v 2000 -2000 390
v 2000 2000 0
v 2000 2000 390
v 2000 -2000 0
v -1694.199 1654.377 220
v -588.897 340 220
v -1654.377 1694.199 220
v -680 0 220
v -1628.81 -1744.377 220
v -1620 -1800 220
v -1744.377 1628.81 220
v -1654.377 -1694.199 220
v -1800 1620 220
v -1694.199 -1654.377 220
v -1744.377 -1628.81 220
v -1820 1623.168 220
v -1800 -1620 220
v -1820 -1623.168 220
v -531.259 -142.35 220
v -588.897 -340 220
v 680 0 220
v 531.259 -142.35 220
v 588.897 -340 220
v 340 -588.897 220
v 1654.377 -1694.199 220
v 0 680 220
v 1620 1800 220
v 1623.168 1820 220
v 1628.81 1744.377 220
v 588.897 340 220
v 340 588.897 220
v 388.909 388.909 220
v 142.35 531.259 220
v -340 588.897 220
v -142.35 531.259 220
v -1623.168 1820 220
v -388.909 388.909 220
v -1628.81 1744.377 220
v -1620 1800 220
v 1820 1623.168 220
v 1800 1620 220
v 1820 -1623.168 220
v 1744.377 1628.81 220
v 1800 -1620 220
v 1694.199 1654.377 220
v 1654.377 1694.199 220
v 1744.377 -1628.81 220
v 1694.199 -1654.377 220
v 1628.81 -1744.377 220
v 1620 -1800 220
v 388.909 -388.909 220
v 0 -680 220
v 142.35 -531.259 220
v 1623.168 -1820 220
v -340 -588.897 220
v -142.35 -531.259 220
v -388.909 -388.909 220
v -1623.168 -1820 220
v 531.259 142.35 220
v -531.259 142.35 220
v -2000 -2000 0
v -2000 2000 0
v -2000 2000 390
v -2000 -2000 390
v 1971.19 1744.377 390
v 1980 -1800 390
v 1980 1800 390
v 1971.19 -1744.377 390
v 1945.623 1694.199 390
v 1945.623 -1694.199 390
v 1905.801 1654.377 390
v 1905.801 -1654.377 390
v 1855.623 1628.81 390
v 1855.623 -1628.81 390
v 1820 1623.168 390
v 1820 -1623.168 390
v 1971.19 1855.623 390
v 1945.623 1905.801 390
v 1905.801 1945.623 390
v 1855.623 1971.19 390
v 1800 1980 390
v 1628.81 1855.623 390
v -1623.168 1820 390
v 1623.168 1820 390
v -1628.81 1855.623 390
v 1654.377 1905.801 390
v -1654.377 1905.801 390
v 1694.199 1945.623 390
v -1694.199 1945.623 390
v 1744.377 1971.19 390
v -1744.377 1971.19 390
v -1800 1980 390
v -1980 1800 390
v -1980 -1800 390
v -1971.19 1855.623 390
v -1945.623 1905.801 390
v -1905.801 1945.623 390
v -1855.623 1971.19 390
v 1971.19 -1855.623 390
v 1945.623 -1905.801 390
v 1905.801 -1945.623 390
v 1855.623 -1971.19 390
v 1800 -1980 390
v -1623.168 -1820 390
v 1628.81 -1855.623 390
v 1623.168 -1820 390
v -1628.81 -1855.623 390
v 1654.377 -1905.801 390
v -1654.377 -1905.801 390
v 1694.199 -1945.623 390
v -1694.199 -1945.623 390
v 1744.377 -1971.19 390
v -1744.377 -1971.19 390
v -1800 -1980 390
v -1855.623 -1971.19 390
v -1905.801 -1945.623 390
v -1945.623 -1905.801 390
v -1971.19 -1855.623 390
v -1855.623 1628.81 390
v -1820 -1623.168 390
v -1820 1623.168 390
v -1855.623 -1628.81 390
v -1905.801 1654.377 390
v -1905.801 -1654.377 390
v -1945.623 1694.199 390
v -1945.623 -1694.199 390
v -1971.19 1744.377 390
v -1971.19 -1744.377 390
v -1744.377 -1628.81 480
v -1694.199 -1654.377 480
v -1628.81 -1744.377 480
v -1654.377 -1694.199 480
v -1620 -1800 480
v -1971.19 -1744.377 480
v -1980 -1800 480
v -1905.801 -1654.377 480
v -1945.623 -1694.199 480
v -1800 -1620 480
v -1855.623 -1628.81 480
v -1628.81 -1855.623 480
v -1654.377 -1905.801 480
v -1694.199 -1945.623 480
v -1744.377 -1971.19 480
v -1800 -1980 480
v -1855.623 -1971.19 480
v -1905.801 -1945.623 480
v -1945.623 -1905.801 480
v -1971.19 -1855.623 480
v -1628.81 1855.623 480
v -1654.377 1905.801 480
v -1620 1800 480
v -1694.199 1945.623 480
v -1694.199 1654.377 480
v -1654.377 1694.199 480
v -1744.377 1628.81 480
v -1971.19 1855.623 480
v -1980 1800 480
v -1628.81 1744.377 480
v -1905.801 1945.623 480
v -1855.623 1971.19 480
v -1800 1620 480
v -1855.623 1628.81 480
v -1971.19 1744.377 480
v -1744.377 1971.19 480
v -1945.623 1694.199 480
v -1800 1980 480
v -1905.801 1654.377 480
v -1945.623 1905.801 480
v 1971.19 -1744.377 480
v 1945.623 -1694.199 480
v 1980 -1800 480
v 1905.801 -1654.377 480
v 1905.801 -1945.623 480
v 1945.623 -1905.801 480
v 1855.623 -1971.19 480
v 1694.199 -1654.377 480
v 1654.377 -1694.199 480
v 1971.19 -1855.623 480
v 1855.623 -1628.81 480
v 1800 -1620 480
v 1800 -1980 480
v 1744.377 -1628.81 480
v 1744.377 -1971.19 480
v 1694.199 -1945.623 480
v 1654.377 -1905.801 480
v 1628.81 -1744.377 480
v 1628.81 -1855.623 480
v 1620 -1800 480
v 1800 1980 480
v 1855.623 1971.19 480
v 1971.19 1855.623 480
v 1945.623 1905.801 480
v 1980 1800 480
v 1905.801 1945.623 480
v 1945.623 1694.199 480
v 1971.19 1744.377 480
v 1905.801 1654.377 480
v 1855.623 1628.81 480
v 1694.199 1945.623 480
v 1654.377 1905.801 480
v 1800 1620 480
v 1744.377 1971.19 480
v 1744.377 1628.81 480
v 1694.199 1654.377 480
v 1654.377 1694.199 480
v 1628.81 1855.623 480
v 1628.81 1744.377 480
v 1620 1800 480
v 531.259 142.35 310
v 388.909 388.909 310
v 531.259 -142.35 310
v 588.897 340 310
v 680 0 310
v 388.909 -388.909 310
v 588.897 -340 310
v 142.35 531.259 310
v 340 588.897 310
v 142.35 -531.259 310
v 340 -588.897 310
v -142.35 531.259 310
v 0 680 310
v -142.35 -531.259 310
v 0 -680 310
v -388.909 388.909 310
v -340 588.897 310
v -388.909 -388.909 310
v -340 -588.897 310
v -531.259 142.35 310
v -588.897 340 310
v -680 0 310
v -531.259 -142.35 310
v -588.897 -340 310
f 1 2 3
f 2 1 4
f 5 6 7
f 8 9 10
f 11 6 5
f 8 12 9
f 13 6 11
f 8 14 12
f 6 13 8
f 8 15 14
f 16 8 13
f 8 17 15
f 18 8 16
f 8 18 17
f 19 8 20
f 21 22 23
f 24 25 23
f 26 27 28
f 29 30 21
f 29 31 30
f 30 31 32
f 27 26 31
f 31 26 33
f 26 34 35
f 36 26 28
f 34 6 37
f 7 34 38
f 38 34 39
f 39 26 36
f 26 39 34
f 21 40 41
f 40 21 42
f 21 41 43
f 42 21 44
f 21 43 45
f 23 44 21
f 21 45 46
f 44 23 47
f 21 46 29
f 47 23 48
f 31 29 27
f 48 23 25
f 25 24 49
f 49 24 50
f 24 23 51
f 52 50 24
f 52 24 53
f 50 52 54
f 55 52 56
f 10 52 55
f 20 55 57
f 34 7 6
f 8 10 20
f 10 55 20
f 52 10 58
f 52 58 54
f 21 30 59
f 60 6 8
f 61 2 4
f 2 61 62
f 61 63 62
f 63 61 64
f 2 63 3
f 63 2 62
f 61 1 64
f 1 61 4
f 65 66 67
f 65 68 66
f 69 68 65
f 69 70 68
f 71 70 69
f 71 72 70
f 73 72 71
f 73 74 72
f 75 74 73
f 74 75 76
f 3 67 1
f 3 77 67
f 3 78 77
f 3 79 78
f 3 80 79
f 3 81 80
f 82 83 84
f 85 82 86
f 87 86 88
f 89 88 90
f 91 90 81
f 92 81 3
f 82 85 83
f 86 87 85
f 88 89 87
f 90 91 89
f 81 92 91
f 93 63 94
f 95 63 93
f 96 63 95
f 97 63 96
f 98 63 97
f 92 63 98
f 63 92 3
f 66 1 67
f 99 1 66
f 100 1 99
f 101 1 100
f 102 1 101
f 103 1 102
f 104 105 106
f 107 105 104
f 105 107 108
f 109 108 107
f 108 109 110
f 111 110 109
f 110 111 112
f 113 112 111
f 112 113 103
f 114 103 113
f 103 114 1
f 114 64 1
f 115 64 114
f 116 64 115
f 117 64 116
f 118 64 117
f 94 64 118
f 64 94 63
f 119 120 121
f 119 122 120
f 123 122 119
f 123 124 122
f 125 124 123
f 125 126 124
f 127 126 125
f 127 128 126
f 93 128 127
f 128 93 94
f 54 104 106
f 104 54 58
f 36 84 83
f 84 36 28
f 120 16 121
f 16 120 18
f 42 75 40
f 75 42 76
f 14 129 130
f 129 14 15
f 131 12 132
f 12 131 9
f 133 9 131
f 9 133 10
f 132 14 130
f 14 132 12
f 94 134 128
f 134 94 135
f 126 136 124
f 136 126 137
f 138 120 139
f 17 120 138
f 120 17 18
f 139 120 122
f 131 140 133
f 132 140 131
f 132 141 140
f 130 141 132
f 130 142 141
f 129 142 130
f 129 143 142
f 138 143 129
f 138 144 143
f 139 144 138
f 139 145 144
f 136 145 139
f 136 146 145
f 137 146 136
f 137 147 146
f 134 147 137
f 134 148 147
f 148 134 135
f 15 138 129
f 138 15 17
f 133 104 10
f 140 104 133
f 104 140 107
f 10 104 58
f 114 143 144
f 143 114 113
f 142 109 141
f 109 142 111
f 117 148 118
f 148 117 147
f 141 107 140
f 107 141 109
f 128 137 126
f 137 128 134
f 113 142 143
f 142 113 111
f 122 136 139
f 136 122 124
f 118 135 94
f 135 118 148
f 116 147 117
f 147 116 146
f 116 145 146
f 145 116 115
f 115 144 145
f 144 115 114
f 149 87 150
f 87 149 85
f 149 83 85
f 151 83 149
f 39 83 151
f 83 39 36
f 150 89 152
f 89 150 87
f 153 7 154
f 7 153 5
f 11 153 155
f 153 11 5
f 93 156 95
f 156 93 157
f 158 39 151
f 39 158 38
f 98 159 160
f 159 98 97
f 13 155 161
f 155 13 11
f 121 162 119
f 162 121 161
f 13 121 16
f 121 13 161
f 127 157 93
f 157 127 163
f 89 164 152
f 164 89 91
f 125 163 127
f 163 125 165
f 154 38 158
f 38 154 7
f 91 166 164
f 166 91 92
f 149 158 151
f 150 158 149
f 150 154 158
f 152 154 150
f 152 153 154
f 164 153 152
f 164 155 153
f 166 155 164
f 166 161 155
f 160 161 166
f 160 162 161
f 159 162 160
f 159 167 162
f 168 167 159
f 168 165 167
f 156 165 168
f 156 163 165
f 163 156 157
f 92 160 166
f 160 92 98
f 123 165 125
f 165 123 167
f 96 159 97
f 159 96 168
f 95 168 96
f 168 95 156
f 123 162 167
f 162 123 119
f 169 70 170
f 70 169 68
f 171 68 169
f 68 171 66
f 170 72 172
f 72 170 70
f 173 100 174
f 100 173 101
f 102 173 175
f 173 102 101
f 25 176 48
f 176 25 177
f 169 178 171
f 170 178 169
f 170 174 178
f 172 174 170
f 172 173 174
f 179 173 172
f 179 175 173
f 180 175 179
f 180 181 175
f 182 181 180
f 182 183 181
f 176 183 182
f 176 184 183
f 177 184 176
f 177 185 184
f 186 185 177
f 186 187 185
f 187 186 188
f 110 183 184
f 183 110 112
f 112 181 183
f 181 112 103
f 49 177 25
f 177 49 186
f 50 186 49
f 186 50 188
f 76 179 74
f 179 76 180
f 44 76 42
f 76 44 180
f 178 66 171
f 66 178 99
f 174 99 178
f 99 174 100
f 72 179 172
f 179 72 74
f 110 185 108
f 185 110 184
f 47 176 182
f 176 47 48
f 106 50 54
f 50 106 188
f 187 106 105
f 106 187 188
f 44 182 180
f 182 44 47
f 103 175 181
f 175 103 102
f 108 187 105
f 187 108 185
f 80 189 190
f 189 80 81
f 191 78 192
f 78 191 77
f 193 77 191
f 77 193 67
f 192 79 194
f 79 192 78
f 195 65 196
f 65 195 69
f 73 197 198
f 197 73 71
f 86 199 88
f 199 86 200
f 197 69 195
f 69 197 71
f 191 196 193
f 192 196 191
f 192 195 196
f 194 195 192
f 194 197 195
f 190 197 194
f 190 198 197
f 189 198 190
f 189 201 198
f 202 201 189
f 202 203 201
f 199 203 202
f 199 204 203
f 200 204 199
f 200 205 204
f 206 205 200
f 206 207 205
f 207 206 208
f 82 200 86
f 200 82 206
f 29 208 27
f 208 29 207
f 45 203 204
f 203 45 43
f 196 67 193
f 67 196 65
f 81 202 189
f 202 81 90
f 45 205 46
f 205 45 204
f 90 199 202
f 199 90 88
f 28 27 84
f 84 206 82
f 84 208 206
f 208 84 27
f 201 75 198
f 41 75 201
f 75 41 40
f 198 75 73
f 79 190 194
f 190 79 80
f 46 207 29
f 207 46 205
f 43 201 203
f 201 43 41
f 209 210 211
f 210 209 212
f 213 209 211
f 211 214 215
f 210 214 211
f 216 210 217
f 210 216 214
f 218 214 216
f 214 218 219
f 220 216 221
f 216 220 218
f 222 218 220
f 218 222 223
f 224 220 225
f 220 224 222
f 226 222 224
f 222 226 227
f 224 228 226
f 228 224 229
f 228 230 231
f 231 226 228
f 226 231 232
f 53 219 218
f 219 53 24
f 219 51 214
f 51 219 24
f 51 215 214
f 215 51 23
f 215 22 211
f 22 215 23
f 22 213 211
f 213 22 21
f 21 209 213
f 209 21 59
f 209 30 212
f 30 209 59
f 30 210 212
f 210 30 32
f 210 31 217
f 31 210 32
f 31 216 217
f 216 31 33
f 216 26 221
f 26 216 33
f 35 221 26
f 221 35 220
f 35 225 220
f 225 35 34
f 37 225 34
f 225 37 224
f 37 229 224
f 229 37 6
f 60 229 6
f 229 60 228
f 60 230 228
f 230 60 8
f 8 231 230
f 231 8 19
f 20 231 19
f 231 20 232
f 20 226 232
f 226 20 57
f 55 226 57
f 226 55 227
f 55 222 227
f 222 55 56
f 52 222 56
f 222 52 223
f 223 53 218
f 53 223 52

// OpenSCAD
// Generated by AXM Machine Geometry Foundry 0.4.0
// Asset: AXM-TERRAIN-TILE-001 AXM Modular Terrain Platform v0.4.0
// Units: millimetres; source orientation: +Z up, -Y forward.
// Canonical source is recipe.json. This is an editable generated bridge.

// instance: platform | base: platform | print_group: platform
color([0.09412, 0.11373, 0.15294, 1.00000])
translate([0, 0, 110]) rotate([0, 0, 0]) scale([1, 1, 1]) cube([4000, 4000, 220], center=true);

// instance: edge_x__l00 | base: edge_x | print_group: edge_x
color([0.17647, 0.22745, 0.29804, 1.00000])
translate([0, -1910, 250]) rotate([0, 0, 0]) scale([1, 1, 1]) cube([4000, 180, 280], center=true);

// instance: edge_x__l01 | base: edge_x | print_group: edge_x
color([0.17647, 0.22745, 0.29804, 1.00000])
translate([0, 1910, 250]) rotate([0, 0, 0]) scale([1, 1, 1]) cube([4000, 180, 280], center=true);

// instance: edge_y__l00 | base: edge_y | print_group: edge_y
color([0.17647, 0.22745, 0.29804, 1.00000])
translate([-1910, 0, 250]) rotate([0, 0, 0]) scale([1, 1, 1]) cube([180, 3640, 280], center=true);

// instance: edge_y__l01 | base: edge_y | print_group: edge_y
color([0.17647, 0.22745, 0.29804, 1.00000])
translate([1910, 0, 250]) rotate([0, 0, 0]) scale([1, 1, 1]) cube([180, 3640, 280], center=true);

// instance: corner_node__g00 | base: corner_node | print_group: corner_node
color([0.13725, 0.80392, 0.92157, 1.00000])
translate([-1800, -1800, 300]) rotate([0, 0, 0]) scale([1, 1, 1]) cylinder(h=360, r=180, center=true, $fn=20);

// instance: corner_node__g01 | base: corner_node | print_group: corner_node
color([0.13725, 0.80392, 0.92157, 1.00000])
translate([-1800, 1800, 300]) rotate([0, 0, 0]) scale([1, 1, 1]) cylinder(h=360, r=180, center=true, $fn=20);

// instance: corner_node__g02 | base: corner_node | print_group: corner_node
color([0.13725, 0.80392, 0.92157, 1.00000])
translate([1800, -1800, 300]) rotate([0, 0, 0]) scale([1, 1, 1]) cylinder(h=360, r=180, center=true, $fn=20);

// instance: corner_node__g03 | base: corner_node | print_group: corner_node
color([0.13725, 0.80392, 0.92157, 1.00000])
translate([1800, 1800, 300]) rotate([0, 0, 0]) scale([1, 1, 1]) cylinder(h=360, r=180, center=true, $fn=20);

// instance: center_plate | base: center_plate | print_group: center_plate
color([1.00000, 0.67451, 0.14510, 1.00000])
translate([0, 0, 265]) rotate([0, 0, 0]) scale([1, 1, 1]) linear_extrude(height=90, center=true, convexity=10) polygon(points=[[680.0, 0.0], [531.25920446, 142.35047481], [588.89727457, 340.0], [388.90872965, 388.90872965], [340.0, 588.89727457], [142.35047481, 531.25920446], [0.0, 680.0], [-142.35047481, 531.25920446], [-340.0, 588.89727457], [-388.90872965, 388.90872965], [-588.89727457, 340.0], [-531.25920446, 142.35047481], [-680.0, 0.0], [-531.25920446, -142.35047481], [-588.89727457, -340.0], [-388.90872965, -388.90872965], [-340.0, -588.89727457], [-142.35047481, -531.25920446], [-0.0, -680.0], [142.35047481, -531.25920446], [340.0, -588.89727457], [388.90872965, -388.90872965], [588.89727457, -340.0], [531.25920446, -142.35047481]]);
